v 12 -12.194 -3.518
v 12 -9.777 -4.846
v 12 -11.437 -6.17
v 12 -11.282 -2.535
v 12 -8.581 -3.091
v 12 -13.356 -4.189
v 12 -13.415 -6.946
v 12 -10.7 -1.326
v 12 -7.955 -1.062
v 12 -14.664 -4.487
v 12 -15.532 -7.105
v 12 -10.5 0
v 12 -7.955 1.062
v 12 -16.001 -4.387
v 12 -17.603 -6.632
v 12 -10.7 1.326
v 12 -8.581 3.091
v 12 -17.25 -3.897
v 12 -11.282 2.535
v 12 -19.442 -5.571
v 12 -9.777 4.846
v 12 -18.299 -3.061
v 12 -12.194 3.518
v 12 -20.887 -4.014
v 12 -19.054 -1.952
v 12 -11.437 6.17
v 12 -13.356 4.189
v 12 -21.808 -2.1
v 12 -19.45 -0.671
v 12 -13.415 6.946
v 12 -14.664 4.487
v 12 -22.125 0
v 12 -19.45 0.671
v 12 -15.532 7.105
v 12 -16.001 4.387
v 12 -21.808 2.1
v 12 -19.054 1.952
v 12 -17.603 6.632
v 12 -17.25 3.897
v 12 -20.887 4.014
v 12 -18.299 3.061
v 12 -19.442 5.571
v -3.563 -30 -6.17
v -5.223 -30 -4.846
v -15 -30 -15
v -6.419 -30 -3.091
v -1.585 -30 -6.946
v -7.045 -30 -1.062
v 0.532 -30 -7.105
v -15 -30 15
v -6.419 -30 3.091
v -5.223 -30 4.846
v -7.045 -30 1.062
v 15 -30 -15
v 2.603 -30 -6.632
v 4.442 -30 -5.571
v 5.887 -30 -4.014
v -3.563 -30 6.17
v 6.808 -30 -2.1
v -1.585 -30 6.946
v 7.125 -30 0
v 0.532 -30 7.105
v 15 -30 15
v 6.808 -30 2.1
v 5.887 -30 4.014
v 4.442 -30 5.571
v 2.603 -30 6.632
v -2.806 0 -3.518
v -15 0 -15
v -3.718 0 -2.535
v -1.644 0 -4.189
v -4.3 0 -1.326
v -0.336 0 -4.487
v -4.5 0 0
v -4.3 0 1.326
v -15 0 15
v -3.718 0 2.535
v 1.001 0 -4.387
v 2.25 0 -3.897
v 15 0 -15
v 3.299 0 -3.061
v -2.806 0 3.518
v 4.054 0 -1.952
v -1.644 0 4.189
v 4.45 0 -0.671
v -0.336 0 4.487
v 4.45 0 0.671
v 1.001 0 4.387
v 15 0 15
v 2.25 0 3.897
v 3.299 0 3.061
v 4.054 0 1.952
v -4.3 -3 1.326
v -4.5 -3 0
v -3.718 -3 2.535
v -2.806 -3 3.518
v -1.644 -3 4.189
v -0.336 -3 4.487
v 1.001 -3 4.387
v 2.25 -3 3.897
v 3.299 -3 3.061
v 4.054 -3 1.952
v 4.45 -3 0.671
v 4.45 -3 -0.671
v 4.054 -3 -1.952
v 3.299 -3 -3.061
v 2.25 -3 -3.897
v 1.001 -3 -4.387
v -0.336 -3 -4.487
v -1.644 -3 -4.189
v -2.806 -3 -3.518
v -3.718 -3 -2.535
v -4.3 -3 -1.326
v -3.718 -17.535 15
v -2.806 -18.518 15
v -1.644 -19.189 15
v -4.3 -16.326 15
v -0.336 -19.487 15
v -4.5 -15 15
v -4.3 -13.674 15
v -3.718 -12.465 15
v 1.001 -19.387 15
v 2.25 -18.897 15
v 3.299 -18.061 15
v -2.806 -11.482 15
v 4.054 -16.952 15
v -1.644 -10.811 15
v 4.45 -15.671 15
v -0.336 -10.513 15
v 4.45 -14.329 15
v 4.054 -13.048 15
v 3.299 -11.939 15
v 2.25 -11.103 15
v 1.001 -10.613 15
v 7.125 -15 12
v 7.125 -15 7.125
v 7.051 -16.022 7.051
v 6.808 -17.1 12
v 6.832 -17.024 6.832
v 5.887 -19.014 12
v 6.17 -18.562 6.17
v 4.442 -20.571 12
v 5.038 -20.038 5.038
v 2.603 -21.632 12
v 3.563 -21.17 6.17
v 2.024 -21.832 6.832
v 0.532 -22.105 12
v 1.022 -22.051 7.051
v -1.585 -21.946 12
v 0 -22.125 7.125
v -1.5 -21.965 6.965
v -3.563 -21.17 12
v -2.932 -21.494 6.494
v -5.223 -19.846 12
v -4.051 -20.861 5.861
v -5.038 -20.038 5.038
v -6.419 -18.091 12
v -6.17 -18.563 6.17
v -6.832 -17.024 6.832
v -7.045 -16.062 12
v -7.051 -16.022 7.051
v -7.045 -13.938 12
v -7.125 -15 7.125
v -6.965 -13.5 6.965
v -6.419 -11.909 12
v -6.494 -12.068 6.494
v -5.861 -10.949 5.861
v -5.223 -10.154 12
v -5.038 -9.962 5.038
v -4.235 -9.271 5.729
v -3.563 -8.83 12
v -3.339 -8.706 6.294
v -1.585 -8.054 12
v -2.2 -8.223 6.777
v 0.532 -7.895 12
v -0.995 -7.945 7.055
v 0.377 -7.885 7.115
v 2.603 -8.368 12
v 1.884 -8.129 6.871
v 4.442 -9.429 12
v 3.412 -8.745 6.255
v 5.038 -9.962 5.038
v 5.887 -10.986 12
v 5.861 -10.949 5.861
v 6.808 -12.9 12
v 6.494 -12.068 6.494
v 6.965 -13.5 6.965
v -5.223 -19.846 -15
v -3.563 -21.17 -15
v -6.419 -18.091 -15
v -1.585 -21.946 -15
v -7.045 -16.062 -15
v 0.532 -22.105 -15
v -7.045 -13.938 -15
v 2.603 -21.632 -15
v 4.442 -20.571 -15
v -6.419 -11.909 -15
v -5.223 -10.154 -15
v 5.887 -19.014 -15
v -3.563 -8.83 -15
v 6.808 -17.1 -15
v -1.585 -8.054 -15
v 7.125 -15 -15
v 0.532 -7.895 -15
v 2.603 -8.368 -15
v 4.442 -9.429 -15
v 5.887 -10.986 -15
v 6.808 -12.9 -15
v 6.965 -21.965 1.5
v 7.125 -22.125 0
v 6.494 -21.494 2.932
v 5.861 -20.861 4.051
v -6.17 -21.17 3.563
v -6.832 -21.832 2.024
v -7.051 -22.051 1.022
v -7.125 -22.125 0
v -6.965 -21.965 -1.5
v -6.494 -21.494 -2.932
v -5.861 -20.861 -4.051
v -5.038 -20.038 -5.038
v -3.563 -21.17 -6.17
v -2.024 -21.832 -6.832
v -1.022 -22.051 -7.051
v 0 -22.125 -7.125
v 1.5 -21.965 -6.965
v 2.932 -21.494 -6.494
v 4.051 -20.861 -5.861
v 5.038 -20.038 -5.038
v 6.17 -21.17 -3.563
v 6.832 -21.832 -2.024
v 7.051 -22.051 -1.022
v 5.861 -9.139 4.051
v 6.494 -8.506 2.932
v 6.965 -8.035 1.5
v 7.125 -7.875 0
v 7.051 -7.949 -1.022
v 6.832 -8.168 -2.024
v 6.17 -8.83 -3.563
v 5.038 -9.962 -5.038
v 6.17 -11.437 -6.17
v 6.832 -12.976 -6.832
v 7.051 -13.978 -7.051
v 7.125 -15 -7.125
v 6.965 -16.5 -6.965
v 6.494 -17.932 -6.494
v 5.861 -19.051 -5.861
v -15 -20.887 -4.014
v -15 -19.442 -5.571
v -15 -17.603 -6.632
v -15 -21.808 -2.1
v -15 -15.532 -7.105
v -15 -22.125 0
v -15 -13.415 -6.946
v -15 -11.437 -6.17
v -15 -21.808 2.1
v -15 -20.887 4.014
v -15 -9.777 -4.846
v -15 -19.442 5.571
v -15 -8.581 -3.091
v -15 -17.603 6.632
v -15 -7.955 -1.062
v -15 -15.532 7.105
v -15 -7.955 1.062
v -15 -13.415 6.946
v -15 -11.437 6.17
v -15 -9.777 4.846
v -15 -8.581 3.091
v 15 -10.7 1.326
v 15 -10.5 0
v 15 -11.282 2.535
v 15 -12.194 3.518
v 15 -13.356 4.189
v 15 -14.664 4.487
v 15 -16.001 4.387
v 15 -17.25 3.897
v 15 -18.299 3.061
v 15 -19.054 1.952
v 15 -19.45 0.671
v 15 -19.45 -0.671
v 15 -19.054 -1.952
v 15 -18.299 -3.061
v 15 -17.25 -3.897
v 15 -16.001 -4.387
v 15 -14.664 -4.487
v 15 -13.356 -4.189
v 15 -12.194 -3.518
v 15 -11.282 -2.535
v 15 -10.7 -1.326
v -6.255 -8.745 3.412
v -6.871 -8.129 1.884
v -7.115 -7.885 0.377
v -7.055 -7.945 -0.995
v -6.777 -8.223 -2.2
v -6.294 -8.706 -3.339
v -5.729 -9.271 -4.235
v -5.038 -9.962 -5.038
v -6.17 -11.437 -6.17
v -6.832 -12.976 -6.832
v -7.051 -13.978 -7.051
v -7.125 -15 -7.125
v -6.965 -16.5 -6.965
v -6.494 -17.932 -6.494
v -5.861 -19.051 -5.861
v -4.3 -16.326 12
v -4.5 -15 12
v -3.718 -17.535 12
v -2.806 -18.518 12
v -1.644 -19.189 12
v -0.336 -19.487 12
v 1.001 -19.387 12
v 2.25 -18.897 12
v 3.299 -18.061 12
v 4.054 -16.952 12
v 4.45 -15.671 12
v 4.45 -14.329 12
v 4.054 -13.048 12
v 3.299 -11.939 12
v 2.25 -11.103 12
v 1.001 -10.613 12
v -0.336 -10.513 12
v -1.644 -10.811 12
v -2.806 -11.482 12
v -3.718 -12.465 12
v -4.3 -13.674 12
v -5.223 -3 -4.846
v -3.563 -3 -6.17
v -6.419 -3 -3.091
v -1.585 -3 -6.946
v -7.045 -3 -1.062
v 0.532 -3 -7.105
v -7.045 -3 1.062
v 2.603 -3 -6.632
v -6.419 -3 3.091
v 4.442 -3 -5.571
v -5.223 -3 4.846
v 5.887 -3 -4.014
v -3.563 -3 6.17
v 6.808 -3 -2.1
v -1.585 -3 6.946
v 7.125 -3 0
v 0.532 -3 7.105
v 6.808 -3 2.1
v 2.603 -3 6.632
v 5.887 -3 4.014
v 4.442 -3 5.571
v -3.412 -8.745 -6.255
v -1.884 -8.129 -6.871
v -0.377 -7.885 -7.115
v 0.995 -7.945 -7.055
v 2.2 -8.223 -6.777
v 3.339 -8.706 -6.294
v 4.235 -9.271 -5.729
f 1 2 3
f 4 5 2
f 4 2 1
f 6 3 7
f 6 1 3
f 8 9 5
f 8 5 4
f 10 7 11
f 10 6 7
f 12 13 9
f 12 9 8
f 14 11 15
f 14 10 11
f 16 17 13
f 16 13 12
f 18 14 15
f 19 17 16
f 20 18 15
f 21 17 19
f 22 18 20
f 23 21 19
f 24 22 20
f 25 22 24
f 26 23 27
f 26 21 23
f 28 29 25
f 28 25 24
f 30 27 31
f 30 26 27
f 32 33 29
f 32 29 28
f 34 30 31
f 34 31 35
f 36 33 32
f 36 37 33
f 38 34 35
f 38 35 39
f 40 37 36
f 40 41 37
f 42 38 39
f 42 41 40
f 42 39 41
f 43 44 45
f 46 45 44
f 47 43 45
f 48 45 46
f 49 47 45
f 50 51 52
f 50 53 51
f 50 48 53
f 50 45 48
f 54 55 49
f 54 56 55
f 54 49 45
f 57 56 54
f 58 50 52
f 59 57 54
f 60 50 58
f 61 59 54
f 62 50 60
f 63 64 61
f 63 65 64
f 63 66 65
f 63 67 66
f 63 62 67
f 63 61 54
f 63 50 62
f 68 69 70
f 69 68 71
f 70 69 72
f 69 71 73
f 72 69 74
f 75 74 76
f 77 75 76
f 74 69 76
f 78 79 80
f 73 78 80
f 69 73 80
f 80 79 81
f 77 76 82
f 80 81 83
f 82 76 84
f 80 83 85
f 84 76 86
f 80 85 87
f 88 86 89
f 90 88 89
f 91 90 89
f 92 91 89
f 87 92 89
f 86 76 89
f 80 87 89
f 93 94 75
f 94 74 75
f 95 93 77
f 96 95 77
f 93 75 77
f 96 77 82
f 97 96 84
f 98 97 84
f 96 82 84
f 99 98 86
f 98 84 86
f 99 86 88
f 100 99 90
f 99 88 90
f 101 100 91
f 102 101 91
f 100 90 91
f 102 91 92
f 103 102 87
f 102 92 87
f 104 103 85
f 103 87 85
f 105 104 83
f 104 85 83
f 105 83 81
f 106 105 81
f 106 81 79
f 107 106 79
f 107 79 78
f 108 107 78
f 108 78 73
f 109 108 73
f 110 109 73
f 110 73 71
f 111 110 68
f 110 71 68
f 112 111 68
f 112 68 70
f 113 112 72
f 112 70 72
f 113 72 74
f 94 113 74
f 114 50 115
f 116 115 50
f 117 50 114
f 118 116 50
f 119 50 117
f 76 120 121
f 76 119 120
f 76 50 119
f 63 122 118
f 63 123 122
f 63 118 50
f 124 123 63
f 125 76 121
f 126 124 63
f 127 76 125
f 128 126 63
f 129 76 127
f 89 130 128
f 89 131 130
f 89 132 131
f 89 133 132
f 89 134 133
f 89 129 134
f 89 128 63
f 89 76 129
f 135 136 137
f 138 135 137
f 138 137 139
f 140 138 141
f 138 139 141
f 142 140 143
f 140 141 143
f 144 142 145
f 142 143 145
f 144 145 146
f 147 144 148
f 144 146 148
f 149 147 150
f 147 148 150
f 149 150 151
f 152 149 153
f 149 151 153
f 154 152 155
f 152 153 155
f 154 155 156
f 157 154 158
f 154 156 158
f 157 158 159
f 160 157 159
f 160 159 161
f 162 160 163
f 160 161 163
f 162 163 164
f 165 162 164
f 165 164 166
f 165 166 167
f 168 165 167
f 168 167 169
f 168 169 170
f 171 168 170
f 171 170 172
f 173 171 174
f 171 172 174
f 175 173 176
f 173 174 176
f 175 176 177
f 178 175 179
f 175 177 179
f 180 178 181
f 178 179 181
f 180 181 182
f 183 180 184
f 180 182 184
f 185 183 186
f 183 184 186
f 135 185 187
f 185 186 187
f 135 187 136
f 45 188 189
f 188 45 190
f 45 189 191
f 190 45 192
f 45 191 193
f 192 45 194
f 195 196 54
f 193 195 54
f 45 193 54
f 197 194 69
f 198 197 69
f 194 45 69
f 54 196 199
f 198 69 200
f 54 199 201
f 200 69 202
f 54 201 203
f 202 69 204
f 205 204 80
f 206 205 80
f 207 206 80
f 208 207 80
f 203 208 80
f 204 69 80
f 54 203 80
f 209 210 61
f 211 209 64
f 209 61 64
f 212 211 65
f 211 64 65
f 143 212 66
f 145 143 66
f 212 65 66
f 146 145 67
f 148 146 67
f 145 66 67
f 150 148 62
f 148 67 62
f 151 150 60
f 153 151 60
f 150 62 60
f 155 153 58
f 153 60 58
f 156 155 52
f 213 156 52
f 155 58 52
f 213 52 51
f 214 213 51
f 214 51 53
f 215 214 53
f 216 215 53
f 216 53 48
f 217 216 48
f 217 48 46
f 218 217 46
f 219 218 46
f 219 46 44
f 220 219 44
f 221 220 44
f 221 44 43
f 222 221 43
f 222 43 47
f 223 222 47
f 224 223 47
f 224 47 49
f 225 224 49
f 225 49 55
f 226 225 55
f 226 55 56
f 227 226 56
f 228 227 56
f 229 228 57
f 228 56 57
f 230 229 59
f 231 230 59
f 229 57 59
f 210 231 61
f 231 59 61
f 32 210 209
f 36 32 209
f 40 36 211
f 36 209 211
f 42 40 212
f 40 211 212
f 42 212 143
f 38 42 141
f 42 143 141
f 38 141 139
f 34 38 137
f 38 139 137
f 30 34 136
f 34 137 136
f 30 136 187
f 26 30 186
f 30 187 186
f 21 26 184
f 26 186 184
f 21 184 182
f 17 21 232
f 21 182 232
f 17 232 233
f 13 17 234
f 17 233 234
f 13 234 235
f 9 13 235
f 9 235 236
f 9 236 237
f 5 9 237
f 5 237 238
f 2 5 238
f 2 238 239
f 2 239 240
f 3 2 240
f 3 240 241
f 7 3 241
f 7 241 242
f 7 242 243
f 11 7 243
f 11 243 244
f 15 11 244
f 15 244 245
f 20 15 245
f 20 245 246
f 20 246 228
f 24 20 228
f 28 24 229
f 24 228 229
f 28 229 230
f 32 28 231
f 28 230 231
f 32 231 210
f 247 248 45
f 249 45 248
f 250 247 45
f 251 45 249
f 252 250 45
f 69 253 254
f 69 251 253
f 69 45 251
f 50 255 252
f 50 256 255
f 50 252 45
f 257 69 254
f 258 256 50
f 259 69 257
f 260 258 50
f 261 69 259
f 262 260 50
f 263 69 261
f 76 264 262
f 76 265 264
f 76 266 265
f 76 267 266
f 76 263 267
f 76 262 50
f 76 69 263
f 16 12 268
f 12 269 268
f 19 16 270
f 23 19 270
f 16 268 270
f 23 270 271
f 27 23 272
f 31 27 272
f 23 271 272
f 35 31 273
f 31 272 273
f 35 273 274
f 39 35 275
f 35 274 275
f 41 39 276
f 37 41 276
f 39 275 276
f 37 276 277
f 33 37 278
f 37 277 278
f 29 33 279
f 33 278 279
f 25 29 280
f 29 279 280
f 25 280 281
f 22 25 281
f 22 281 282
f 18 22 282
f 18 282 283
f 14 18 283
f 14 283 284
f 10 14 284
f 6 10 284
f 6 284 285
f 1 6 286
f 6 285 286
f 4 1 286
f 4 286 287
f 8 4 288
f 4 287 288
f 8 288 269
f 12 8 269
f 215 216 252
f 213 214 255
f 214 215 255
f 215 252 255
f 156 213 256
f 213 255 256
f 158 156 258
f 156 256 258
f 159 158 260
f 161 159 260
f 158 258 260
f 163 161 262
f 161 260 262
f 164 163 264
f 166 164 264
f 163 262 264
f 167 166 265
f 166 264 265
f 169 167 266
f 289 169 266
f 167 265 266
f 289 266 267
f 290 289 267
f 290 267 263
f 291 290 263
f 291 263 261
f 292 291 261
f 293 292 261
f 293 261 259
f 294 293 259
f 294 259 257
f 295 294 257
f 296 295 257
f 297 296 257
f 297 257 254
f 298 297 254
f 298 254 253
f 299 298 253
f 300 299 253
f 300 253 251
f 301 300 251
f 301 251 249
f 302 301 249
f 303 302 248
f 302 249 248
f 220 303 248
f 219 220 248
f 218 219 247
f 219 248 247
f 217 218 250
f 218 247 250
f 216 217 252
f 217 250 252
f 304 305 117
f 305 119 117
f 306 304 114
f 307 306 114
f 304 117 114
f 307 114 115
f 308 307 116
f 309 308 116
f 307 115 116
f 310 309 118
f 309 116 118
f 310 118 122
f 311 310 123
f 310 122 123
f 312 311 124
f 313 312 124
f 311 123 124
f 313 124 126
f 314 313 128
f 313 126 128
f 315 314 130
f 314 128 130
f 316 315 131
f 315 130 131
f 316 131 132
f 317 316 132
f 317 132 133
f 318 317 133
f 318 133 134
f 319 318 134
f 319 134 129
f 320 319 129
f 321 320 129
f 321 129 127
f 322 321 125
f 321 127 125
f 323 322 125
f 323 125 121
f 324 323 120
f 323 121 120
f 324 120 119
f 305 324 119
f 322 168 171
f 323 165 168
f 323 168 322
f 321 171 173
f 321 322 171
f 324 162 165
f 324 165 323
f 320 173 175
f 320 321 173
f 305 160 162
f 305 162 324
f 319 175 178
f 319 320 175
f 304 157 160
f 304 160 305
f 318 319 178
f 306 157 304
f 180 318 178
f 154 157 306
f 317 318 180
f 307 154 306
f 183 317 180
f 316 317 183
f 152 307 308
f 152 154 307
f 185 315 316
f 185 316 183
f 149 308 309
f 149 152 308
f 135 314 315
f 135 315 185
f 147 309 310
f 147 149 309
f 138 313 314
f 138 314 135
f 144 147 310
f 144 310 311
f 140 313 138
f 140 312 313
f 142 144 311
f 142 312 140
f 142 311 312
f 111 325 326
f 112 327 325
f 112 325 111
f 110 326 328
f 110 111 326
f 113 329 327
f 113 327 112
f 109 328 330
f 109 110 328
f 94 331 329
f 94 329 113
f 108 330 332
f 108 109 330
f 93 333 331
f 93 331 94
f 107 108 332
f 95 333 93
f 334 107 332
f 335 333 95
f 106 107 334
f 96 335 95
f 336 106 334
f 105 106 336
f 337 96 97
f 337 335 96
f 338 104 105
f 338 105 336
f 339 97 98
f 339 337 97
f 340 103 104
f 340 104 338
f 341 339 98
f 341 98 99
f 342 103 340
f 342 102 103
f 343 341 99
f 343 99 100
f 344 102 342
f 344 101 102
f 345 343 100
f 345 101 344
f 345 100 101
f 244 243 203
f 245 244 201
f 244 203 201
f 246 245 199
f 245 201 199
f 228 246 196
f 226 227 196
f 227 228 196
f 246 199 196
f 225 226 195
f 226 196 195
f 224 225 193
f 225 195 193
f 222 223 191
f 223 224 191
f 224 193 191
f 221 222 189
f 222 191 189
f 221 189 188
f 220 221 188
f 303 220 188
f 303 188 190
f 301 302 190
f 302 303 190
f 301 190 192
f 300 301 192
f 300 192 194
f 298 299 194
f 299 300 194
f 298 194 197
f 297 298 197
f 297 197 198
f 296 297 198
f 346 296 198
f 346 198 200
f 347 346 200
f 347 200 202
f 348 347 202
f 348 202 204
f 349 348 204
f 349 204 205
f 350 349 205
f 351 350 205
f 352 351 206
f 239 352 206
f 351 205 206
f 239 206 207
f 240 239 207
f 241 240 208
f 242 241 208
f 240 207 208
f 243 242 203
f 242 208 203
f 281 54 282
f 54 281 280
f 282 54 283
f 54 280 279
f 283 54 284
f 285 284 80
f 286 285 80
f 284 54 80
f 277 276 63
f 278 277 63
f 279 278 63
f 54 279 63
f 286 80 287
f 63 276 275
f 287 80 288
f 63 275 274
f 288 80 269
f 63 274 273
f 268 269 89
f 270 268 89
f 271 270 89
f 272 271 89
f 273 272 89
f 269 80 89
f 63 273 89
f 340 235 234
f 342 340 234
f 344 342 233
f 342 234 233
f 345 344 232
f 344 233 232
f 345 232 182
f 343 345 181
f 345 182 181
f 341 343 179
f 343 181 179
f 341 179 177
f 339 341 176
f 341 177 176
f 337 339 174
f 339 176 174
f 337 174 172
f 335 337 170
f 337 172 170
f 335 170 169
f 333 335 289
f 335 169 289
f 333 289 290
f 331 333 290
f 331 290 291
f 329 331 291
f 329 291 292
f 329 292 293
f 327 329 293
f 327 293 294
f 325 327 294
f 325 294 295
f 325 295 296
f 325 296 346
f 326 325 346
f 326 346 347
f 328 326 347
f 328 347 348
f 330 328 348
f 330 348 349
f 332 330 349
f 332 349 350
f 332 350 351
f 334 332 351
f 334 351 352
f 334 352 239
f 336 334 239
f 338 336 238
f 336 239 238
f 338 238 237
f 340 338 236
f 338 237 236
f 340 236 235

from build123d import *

# Parameters (mm, degrees)
F0_W           = 30
F0_H           = 30
F1_DEPTH       = 30
F3_D           = 9
F3_CBORE_D     = 14.25
F3_CBORE_DEPTH = 27
F5_D           = 9
F5_CBORE_D     = 14.25
F5_CBORE_DEPTH = 27
F7_D           = 9
F7_CBORE_D     = 14.25
F7_CBORE_DEPTH = 27


with BuildPart() as f1:
    # F0 (on Front) → F1 (new body)
    with BuildSketch(Plane.XZ):
        Rectangle(F0_W, F0_H)
    extrude(amount=F1_DEPTH)

    # F3 (through all)
    with Locations(Plane.XZ.offset(30)):
        with Locations((0, 0)):
            CounterBoreHole(F3_D / 2, F3_CBORE_D / 2, F3_CBORE_DEPTH)

    # F5 (through all)
    with Locations(Plane(origin=(-15, 0, 0), x_dir=(0, -1, 0), z_dir=(-1, 0, 0))):
        with Locations((15, 0)):
            CounterBoreHole(F5_D / 2, F5_CBORE_D / 2, F5_CBORE_DEPTH)

    # F7 (through all)
    with Locations(Plane(origin=(0, 0, -15), x_dir=(1, 0, 0), z_dir=(0, 0, -1))):
        with Locations((0, 15)):
            CounterBoreHole(F7_D / 2, F7_CBORE_D / 2, F7_CBORE_DEPTH)


solid = f1.part
